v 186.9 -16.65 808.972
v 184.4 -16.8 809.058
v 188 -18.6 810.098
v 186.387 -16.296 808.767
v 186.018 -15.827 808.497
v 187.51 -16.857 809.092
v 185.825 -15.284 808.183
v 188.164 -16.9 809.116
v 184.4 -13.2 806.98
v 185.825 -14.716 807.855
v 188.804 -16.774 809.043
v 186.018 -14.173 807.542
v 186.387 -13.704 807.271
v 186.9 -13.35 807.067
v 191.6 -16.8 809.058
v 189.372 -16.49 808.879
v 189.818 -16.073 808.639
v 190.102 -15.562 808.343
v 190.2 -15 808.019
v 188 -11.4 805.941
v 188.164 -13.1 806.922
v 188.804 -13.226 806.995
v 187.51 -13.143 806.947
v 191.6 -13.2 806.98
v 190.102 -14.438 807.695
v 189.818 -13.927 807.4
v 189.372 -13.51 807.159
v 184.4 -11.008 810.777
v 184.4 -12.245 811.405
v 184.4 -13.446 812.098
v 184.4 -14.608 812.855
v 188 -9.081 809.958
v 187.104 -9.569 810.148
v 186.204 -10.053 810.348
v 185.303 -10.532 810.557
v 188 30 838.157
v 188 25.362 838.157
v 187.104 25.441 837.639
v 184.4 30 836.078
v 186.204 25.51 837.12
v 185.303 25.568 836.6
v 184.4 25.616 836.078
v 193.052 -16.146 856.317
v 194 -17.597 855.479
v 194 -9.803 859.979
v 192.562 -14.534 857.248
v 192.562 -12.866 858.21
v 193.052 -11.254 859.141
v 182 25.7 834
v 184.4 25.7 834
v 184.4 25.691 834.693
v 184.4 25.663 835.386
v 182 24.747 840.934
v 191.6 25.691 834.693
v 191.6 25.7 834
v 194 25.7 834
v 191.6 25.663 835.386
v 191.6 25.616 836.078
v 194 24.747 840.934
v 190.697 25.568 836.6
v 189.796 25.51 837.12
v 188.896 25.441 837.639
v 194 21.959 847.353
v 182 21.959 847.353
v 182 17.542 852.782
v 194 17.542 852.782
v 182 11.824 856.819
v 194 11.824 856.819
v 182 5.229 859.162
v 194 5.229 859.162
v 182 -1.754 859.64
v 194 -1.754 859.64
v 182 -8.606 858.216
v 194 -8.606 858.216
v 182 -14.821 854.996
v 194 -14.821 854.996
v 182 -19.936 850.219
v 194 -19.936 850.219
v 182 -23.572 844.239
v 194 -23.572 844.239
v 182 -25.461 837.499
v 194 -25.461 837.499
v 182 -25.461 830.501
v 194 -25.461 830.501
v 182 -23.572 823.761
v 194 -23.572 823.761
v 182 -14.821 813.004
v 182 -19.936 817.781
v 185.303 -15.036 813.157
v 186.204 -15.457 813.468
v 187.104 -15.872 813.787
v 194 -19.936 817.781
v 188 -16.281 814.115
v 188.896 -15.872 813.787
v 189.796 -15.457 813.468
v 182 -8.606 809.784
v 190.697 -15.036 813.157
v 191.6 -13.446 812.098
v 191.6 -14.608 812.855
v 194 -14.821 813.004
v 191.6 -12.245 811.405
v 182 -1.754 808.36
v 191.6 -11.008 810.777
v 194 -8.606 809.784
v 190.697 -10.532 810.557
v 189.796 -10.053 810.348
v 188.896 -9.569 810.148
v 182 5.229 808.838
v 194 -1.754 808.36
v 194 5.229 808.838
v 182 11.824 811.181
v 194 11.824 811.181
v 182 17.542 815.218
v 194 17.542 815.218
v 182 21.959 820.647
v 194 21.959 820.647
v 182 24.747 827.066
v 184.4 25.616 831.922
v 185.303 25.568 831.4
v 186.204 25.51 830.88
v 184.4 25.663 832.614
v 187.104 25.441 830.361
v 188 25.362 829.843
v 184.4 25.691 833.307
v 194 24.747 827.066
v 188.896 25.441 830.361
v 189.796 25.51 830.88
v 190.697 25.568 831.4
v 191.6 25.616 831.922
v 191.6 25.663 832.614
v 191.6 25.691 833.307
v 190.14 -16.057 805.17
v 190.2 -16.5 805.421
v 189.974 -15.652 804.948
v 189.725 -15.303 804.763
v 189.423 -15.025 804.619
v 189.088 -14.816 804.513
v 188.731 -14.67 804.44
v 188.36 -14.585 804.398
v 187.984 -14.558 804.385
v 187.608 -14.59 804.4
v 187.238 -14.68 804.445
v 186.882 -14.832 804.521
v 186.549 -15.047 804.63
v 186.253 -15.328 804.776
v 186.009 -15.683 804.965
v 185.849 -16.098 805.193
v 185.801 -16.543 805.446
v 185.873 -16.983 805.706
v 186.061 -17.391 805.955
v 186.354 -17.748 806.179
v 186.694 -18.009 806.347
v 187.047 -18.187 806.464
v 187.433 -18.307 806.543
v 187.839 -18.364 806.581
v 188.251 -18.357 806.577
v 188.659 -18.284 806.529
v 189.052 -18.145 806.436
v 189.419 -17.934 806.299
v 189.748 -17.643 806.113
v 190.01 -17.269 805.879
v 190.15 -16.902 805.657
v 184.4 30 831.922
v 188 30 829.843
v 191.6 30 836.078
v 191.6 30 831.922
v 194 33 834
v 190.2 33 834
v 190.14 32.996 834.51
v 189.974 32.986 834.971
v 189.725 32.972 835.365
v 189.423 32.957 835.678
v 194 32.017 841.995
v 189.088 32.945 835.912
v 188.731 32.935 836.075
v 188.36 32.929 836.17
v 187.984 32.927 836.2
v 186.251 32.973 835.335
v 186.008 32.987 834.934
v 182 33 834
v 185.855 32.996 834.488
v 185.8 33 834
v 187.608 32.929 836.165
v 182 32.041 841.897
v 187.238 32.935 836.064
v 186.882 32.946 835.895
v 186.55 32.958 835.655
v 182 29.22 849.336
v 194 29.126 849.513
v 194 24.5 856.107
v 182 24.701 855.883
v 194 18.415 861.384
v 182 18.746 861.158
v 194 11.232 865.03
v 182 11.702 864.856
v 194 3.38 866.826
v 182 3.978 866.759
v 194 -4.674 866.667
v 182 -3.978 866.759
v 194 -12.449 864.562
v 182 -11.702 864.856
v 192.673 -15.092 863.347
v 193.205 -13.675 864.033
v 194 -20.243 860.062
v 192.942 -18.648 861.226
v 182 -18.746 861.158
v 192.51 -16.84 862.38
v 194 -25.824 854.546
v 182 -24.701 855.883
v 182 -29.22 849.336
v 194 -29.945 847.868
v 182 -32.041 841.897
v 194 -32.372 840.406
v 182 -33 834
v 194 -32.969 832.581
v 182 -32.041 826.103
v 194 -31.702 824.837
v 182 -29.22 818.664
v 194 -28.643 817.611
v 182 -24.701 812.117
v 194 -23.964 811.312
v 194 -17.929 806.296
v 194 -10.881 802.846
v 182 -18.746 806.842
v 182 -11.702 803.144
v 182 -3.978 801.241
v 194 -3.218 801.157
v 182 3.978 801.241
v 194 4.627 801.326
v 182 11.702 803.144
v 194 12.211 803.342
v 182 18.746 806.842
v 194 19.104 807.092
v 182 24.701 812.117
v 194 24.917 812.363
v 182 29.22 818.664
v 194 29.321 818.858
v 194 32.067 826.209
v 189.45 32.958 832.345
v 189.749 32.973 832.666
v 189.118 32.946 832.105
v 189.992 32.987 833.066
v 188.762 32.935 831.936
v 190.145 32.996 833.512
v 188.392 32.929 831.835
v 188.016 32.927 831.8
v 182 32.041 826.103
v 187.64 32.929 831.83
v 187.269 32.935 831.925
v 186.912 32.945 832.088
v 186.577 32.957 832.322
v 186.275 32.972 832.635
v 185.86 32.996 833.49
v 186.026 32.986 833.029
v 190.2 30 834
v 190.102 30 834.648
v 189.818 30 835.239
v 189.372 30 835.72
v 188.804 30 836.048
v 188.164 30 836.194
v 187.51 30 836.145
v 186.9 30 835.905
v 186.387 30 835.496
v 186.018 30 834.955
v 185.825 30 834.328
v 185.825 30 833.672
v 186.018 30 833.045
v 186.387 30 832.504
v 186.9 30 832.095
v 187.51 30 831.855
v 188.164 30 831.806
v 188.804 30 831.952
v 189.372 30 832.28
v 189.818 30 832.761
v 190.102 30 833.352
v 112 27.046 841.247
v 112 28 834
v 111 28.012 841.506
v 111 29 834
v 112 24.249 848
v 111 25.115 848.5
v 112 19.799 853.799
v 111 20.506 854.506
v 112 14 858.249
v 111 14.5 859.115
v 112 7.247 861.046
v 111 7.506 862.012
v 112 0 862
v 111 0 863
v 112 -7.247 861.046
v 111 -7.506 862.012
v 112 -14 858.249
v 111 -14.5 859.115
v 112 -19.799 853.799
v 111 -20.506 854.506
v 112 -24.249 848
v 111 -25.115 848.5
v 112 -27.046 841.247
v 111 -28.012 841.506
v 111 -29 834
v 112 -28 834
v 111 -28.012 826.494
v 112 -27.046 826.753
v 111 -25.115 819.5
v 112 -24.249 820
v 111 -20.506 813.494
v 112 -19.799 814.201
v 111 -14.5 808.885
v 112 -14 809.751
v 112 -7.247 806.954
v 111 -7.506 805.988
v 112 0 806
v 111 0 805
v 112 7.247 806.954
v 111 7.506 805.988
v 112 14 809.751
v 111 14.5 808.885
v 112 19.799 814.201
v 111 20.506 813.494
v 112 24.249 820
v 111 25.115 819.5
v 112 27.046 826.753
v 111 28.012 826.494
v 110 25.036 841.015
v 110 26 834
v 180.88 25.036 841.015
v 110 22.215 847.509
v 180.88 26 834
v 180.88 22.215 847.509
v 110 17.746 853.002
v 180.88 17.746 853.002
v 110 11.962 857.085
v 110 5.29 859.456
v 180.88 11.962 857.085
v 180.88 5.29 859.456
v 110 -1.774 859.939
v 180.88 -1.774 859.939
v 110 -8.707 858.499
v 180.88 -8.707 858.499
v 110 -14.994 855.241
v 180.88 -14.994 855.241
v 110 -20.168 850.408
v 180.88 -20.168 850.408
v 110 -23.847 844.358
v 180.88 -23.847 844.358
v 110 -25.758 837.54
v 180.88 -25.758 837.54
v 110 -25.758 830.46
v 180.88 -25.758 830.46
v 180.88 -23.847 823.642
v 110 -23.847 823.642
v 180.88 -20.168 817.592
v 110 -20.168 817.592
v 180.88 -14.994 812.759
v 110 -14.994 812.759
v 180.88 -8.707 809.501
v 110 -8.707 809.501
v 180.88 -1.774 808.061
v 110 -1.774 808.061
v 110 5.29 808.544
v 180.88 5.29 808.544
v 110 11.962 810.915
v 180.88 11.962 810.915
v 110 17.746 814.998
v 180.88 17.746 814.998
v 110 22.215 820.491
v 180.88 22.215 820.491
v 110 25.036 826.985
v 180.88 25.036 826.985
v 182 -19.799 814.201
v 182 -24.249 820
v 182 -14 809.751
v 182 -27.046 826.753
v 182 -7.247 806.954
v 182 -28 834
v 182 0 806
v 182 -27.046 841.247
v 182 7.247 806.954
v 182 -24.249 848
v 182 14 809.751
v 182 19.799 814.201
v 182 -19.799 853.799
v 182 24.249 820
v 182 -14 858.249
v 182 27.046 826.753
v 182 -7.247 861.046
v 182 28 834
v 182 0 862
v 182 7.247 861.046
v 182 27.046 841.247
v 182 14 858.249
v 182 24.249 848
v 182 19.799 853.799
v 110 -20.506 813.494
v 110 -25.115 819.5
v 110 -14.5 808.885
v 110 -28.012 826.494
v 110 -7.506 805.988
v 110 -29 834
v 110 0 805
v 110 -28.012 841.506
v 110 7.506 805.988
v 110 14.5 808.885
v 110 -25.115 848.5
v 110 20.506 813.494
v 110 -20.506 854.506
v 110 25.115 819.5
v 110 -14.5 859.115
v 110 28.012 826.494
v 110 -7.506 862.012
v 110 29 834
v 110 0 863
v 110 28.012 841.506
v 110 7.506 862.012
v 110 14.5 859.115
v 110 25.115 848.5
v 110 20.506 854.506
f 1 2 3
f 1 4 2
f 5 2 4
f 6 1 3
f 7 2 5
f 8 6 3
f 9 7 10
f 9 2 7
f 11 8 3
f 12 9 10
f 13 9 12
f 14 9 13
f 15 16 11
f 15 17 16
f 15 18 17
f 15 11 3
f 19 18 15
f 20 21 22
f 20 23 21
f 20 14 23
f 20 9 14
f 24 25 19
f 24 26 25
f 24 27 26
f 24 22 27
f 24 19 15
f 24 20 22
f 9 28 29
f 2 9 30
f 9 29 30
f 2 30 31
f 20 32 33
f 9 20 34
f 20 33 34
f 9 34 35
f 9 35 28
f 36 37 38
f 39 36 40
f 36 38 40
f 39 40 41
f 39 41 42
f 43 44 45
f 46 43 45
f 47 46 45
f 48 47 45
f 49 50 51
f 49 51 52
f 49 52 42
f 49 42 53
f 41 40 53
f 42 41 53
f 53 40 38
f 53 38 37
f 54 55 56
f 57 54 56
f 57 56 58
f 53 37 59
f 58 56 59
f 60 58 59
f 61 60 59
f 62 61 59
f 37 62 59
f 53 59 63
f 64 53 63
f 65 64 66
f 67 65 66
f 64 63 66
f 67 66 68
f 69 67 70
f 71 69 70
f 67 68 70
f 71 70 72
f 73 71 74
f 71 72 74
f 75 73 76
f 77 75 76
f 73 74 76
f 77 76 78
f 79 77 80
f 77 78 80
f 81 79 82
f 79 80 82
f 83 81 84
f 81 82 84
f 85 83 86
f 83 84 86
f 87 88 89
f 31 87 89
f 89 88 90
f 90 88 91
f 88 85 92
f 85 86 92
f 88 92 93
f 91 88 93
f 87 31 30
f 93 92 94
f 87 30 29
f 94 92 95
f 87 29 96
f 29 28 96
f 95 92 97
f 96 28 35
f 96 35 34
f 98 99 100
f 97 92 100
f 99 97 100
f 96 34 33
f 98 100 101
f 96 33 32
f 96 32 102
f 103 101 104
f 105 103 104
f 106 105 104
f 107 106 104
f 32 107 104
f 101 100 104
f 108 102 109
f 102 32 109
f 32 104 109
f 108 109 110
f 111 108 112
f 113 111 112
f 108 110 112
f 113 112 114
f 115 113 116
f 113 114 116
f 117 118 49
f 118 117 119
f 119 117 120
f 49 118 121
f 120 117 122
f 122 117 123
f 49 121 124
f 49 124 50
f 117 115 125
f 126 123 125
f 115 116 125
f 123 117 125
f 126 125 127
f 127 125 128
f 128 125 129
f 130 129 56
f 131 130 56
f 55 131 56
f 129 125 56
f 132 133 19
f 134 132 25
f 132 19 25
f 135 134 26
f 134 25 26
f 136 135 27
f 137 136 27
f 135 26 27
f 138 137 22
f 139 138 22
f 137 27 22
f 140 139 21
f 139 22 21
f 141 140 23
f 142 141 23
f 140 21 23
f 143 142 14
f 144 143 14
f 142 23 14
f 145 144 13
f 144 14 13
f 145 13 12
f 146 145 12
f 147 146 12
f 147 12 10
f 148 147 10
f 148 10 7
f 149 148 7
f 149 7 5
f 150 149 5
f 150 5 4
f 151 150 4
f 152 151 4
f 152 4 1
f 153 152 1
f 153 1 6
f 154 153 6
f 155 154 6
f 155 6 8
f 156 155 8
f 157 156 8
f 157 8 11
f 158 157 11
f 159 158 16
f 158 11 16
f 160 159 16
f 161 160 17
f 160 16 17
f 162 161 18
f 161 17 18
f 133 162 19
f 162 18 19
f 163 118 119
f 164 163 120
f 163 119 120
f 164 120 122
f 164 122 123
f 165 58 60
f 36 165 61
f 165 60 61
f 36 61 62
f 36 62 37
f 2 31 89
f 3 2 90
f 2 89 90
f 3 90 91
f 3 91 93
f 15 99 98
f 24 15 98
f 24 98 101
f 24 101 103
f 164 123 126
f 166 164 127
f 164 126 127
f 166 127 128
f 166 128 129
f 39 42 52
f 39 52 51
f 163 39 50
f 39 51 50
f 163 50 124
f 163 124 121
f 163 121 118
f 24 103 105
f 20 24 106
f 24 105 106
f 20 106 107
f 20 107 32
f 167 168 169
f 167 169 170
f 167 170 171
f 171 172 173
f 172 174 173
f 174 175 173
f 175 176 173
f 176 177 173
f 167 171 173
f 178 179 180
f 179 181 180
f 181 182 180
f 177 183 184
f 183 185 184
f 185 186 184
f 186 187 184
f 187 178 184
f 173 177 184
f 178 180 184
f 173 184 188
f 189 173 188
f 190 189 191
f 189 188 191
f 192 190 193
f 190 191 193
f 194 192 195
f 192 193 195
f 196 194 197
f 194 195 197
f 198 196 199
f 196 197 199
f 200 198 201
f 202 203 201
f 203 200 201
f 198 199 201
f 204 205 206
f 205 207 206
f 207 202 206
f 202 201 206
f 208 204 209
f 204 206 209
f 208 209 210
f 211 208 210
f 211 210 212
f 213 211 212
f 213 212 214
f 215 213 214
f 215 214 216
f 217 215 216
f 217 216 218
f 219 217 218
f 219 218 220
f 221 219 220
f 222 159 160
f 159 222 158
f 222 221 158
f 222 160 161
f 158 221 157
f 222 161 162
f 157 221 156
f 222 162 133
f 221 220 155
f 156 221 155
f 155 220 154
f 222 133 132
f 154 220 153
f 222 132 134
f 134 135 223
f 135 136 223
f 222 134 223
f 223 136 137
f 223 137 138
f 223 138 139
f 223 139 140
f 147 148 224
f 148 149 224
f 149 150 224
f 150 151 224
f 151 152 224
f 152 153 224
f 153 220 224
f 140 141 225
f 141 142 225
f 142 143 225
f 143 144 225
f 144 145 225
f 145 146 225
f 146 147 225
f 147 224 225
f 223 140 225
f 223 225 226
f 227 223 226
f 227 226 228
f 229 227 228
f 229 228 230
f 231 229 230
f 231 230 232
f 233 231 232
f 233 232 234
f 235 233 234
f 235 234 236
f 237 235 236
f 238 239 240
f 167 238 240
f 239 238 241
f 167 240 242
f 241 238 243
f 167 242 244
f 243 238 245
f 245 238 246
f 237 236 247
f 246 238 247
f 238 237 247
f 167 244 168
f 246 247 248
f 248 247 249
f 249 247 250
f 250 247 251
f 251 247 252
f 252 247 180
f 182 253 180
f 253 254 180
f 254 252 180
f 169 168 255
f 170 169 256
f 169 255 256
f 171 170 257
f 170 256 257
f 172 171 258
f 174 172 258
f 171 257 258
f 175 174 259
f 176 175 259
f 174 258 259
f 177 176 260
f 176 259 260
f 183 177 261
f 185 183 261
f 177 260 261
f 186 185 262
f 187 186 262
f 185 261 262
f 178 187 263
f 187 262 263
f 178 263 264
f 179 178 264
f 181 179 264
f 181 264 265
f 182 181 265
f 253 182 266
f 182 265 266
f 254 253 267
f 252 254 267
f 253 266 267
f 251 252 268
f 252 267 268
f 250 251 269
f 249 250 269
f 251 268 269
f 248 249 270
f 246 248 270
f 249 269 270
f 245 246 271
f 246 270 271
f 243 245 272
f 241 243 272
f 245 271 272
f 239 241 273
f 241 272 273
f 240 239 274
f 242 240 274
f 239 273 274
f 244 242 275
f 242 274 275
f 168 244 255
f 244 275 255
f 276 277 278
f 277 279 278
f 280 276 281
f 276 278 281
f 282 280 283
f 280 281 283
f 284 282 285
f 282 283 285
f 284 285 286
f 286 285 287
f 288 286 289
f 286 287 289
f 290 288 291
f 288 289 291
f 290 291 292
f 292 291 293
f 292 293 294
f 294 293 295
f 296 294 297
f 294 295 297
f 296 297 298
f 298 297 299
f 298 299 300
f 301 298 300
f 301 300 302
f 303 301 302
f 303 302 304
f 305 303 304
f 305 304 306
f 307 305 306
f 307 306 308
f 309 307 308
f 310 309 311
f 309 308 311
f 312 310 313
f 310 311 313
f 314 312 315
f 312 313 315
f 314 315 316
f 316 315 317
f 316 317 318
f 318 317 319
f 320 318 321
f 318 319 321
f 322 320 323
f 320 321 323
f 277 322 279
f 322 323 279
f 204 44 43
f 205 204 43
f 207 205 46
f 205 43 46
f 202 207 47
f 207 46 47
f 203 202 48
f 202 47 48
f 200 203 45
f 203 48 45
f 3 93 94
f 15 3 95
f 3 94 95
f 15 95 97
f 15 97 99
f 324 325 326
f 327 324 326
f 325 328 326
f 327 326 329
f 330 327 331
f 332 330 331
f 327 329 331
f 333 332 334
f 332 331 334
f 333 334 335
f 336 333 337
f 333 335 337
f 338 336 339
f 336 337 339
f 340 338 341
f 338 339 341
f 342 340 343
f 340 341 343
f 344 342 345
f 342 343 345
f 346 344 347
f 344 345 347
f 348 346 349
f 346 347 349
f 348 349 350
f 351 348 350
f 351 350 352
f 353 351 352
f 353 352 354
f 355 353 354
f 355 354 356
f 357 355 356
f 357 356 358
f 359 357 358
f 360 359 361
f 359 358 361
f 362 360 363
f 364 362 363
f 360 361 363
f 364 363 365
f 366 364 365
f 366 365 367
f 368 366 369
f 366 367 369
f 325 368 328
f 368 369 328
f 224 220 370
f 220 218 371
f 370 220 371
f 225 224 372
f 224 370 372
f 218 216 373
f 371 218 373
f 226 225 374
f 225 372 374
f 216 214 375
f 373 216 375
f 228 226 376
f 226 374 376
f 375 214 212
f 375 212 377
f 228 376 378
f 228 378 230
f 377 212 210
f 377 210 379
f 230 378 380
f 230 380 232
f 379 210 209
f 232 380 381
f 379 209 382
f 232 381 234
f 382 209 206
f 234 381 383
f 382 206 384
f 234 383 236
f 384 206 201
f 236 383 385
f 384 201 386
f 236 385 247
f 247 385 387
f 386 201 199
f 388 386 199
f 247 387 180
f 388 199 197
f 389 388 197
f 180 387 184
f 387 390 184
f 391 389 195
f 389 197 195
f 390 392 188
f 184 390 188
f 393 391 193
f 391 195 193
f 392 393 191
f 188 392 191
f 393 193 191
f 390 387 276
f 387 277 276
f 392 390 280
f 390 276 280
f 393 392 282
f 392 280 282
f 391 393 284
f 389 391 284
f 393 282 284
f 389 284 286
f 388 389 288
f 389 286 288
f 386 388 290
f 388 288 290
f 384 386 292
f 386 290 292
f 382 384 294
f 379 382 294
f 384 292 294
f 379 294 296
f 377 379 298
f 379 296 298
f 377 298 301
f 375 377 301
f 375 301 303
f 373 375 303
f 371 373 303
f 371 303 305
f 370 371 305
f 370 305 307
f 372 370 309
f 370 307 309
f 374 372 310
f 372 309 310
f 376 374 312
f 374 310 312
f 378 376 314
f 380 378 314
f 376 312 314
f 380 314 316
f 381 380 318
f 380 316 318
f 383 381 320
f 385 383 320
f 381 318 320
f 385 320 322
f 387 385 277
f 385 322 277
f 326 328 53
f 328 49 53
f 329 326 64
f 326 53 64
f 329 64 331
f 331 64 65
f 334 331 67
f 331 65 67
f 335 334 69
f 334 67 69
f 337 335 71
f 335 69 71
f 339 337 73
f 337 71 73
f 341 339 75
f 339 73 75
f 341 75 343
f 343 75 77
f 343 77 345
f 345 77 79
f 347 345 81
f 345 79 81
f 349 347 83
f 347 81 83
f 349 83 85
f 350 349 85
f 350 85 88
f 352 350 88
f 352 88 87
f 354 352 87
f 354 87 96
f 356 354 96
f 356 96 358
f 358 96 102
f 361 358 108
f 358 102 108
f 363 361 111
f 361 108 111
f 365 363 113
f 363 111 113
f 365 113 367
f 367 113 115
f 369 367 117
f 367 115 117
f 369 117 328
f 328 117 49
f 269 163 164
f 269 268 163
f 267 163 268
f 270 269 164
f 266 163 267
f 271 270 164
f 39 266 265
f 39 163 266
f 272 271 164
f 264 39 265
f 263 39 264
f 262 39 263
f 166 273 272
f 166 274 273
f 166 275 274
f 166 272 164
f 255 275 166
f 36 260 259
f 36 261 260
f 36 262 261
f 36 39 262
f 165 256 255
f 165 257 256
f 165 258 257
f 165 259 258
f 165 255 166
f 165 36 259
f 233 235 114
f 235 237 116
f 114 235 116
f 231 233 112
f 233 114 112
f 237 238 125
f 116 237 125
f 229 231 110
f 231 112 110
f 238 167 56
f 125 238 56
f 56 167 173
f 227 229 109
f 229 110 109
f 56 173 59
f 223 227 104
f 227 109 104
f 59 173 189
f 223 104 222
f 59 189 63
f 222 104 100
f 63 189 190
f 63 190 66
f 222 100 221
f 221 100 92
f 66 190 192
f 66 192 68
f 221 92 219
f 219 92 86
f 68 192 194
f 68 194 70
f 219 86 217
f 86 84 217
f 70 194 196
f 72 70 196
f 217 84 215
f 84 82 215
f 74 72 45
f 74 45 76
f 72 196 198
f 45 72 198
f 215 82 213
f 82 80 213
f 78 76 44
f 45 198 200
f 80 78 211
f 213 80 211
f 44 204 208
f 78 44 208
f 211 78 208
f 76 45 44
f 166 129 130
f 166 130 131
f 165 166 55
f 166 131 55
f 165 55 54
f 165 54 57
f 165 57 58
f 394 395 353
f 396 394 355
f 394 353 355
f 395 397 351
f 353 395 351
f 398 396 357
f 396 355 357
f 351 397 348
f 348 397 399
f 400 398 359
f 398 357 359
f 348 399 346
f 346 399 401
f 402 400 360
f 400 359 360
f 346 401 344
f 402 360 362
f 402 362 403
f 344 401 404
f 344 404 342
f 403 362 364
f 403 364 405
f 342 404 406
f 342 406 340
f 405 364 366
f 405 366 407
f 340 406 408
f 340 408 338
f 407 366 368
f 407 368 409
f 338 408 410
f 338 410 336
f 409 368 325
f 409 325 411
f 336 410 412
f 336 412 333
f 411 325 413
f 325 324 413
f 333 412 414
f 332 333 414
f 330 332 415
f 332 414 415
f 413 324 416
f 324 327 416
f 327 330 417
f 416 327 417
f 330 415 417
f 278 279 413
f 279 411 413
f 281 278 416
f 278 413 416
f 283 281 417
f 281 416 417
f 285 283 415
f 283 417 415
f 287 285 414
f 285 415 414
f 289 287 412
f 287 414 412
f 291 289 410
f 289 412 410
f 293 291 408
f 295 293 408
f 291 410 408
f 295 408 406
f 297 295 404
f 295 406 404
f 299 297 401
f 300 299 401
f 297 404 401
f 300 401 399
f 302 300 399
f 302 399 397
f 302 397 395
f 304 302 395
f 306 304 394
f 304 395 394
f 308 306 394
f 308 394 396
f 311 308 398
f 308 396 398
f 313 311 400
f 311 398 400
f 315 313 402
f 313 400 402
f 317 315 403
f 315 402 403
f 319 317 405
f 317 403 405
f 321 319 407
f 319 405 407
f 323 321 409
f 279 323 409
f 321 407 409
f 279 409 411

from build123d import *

# Parameters (mm, degrees)
POCKET027_DEPTH       = 30
SKETCH032_R           = 2.2
POCKET028_DEPTH       = 284.142394
POLARPATTERN002_COUNT = 2
POLARPATTERN002_ANGLE = 240
SKETCH146_R           = 7.5
POCKET091_DEPTH       = 17.679838


with BuildPart() as part:
    # Sketch022 → Revolution001 (revolve)
    with BuildSketch(Plane.XY):
        Polygon((0, 26), (70.880385, 26), (72, 25.7), (84, 25.7), (84, 33), (72, 33), (72, 28), (2, 28), (1, 29), (0, 29), align=None)
    revolve(axis=Axis((0, 0, 0), (1, 0, 0)))

    # Sketch031 (on DatumPlane) → Pocket027 (cut)
    with BuildSketch(Plane(origin=(78, 0, 0), x_dir=(1, 0, 0), z_dir=(0, -1, 0))):
        Polygon((3.6, 2.078461), (0, 4.156922), (-3.6, 2.078461), (-3.6, -2.078461), (0, -4.156922), (3.6, -2.078461), align=None)
    pocket027 = extrude(amount=-POCKET027_DEPTH, mode=Mode.SUBTRACT)

    # Sketch032 (on DatumPlane) → Pocket028 (cut, through all)
    with BuildSketch(Plane(origin=(78, 0, 0), x_dir=(1, 0, 0), z_dir=(0, -1, 0))):
        Circle(SKETCH032_R)
    pocket028 = extrude(amount=-POCKET028_DEPTH, mode=Mode.SUBTRACT)

    # PolarPattern002: Pocket028, Pocket027 ×2 about axis
    polarpattern002_axis = Axis((0, 0, 0), (1, 0, 0))
    for i in range(1, POLARPATTERN002_COUNT):
        add(pocket028.rotate(polarpattern002_axis, i * POLARPATTERN002_ANGLE / (POLARPATTERN002_COUNT - 1)), mode=Mode.SUBTRACT)
        add(pocket027.rotate(polarpattern002_axis, i * POLARPATTERN002_ANGLE / (POLARPATTERN002_COUNT - 1)), mode=Mode.SUBTRACT)

    # Sketch146 (on DatumPlane) → Pocket091 (cut, through all)
    with BuildSketch(Plane(origin=(72, -13.7, 23.729096), x_dir=(1, 0, 0), z_dir=(0, 0.5, -0.866025))):
        with Locations((18, 0)):
            Circle(SKETCH146_R)
    extrude(amount=-POCKET091_DEPTH, mode=Mode.SUBTRACT)


with BuildPart() as part_1:
    # Body007 placement: moved
    add(part.part.moved(Location((110, 0, 834))))


solid = part_1.part
